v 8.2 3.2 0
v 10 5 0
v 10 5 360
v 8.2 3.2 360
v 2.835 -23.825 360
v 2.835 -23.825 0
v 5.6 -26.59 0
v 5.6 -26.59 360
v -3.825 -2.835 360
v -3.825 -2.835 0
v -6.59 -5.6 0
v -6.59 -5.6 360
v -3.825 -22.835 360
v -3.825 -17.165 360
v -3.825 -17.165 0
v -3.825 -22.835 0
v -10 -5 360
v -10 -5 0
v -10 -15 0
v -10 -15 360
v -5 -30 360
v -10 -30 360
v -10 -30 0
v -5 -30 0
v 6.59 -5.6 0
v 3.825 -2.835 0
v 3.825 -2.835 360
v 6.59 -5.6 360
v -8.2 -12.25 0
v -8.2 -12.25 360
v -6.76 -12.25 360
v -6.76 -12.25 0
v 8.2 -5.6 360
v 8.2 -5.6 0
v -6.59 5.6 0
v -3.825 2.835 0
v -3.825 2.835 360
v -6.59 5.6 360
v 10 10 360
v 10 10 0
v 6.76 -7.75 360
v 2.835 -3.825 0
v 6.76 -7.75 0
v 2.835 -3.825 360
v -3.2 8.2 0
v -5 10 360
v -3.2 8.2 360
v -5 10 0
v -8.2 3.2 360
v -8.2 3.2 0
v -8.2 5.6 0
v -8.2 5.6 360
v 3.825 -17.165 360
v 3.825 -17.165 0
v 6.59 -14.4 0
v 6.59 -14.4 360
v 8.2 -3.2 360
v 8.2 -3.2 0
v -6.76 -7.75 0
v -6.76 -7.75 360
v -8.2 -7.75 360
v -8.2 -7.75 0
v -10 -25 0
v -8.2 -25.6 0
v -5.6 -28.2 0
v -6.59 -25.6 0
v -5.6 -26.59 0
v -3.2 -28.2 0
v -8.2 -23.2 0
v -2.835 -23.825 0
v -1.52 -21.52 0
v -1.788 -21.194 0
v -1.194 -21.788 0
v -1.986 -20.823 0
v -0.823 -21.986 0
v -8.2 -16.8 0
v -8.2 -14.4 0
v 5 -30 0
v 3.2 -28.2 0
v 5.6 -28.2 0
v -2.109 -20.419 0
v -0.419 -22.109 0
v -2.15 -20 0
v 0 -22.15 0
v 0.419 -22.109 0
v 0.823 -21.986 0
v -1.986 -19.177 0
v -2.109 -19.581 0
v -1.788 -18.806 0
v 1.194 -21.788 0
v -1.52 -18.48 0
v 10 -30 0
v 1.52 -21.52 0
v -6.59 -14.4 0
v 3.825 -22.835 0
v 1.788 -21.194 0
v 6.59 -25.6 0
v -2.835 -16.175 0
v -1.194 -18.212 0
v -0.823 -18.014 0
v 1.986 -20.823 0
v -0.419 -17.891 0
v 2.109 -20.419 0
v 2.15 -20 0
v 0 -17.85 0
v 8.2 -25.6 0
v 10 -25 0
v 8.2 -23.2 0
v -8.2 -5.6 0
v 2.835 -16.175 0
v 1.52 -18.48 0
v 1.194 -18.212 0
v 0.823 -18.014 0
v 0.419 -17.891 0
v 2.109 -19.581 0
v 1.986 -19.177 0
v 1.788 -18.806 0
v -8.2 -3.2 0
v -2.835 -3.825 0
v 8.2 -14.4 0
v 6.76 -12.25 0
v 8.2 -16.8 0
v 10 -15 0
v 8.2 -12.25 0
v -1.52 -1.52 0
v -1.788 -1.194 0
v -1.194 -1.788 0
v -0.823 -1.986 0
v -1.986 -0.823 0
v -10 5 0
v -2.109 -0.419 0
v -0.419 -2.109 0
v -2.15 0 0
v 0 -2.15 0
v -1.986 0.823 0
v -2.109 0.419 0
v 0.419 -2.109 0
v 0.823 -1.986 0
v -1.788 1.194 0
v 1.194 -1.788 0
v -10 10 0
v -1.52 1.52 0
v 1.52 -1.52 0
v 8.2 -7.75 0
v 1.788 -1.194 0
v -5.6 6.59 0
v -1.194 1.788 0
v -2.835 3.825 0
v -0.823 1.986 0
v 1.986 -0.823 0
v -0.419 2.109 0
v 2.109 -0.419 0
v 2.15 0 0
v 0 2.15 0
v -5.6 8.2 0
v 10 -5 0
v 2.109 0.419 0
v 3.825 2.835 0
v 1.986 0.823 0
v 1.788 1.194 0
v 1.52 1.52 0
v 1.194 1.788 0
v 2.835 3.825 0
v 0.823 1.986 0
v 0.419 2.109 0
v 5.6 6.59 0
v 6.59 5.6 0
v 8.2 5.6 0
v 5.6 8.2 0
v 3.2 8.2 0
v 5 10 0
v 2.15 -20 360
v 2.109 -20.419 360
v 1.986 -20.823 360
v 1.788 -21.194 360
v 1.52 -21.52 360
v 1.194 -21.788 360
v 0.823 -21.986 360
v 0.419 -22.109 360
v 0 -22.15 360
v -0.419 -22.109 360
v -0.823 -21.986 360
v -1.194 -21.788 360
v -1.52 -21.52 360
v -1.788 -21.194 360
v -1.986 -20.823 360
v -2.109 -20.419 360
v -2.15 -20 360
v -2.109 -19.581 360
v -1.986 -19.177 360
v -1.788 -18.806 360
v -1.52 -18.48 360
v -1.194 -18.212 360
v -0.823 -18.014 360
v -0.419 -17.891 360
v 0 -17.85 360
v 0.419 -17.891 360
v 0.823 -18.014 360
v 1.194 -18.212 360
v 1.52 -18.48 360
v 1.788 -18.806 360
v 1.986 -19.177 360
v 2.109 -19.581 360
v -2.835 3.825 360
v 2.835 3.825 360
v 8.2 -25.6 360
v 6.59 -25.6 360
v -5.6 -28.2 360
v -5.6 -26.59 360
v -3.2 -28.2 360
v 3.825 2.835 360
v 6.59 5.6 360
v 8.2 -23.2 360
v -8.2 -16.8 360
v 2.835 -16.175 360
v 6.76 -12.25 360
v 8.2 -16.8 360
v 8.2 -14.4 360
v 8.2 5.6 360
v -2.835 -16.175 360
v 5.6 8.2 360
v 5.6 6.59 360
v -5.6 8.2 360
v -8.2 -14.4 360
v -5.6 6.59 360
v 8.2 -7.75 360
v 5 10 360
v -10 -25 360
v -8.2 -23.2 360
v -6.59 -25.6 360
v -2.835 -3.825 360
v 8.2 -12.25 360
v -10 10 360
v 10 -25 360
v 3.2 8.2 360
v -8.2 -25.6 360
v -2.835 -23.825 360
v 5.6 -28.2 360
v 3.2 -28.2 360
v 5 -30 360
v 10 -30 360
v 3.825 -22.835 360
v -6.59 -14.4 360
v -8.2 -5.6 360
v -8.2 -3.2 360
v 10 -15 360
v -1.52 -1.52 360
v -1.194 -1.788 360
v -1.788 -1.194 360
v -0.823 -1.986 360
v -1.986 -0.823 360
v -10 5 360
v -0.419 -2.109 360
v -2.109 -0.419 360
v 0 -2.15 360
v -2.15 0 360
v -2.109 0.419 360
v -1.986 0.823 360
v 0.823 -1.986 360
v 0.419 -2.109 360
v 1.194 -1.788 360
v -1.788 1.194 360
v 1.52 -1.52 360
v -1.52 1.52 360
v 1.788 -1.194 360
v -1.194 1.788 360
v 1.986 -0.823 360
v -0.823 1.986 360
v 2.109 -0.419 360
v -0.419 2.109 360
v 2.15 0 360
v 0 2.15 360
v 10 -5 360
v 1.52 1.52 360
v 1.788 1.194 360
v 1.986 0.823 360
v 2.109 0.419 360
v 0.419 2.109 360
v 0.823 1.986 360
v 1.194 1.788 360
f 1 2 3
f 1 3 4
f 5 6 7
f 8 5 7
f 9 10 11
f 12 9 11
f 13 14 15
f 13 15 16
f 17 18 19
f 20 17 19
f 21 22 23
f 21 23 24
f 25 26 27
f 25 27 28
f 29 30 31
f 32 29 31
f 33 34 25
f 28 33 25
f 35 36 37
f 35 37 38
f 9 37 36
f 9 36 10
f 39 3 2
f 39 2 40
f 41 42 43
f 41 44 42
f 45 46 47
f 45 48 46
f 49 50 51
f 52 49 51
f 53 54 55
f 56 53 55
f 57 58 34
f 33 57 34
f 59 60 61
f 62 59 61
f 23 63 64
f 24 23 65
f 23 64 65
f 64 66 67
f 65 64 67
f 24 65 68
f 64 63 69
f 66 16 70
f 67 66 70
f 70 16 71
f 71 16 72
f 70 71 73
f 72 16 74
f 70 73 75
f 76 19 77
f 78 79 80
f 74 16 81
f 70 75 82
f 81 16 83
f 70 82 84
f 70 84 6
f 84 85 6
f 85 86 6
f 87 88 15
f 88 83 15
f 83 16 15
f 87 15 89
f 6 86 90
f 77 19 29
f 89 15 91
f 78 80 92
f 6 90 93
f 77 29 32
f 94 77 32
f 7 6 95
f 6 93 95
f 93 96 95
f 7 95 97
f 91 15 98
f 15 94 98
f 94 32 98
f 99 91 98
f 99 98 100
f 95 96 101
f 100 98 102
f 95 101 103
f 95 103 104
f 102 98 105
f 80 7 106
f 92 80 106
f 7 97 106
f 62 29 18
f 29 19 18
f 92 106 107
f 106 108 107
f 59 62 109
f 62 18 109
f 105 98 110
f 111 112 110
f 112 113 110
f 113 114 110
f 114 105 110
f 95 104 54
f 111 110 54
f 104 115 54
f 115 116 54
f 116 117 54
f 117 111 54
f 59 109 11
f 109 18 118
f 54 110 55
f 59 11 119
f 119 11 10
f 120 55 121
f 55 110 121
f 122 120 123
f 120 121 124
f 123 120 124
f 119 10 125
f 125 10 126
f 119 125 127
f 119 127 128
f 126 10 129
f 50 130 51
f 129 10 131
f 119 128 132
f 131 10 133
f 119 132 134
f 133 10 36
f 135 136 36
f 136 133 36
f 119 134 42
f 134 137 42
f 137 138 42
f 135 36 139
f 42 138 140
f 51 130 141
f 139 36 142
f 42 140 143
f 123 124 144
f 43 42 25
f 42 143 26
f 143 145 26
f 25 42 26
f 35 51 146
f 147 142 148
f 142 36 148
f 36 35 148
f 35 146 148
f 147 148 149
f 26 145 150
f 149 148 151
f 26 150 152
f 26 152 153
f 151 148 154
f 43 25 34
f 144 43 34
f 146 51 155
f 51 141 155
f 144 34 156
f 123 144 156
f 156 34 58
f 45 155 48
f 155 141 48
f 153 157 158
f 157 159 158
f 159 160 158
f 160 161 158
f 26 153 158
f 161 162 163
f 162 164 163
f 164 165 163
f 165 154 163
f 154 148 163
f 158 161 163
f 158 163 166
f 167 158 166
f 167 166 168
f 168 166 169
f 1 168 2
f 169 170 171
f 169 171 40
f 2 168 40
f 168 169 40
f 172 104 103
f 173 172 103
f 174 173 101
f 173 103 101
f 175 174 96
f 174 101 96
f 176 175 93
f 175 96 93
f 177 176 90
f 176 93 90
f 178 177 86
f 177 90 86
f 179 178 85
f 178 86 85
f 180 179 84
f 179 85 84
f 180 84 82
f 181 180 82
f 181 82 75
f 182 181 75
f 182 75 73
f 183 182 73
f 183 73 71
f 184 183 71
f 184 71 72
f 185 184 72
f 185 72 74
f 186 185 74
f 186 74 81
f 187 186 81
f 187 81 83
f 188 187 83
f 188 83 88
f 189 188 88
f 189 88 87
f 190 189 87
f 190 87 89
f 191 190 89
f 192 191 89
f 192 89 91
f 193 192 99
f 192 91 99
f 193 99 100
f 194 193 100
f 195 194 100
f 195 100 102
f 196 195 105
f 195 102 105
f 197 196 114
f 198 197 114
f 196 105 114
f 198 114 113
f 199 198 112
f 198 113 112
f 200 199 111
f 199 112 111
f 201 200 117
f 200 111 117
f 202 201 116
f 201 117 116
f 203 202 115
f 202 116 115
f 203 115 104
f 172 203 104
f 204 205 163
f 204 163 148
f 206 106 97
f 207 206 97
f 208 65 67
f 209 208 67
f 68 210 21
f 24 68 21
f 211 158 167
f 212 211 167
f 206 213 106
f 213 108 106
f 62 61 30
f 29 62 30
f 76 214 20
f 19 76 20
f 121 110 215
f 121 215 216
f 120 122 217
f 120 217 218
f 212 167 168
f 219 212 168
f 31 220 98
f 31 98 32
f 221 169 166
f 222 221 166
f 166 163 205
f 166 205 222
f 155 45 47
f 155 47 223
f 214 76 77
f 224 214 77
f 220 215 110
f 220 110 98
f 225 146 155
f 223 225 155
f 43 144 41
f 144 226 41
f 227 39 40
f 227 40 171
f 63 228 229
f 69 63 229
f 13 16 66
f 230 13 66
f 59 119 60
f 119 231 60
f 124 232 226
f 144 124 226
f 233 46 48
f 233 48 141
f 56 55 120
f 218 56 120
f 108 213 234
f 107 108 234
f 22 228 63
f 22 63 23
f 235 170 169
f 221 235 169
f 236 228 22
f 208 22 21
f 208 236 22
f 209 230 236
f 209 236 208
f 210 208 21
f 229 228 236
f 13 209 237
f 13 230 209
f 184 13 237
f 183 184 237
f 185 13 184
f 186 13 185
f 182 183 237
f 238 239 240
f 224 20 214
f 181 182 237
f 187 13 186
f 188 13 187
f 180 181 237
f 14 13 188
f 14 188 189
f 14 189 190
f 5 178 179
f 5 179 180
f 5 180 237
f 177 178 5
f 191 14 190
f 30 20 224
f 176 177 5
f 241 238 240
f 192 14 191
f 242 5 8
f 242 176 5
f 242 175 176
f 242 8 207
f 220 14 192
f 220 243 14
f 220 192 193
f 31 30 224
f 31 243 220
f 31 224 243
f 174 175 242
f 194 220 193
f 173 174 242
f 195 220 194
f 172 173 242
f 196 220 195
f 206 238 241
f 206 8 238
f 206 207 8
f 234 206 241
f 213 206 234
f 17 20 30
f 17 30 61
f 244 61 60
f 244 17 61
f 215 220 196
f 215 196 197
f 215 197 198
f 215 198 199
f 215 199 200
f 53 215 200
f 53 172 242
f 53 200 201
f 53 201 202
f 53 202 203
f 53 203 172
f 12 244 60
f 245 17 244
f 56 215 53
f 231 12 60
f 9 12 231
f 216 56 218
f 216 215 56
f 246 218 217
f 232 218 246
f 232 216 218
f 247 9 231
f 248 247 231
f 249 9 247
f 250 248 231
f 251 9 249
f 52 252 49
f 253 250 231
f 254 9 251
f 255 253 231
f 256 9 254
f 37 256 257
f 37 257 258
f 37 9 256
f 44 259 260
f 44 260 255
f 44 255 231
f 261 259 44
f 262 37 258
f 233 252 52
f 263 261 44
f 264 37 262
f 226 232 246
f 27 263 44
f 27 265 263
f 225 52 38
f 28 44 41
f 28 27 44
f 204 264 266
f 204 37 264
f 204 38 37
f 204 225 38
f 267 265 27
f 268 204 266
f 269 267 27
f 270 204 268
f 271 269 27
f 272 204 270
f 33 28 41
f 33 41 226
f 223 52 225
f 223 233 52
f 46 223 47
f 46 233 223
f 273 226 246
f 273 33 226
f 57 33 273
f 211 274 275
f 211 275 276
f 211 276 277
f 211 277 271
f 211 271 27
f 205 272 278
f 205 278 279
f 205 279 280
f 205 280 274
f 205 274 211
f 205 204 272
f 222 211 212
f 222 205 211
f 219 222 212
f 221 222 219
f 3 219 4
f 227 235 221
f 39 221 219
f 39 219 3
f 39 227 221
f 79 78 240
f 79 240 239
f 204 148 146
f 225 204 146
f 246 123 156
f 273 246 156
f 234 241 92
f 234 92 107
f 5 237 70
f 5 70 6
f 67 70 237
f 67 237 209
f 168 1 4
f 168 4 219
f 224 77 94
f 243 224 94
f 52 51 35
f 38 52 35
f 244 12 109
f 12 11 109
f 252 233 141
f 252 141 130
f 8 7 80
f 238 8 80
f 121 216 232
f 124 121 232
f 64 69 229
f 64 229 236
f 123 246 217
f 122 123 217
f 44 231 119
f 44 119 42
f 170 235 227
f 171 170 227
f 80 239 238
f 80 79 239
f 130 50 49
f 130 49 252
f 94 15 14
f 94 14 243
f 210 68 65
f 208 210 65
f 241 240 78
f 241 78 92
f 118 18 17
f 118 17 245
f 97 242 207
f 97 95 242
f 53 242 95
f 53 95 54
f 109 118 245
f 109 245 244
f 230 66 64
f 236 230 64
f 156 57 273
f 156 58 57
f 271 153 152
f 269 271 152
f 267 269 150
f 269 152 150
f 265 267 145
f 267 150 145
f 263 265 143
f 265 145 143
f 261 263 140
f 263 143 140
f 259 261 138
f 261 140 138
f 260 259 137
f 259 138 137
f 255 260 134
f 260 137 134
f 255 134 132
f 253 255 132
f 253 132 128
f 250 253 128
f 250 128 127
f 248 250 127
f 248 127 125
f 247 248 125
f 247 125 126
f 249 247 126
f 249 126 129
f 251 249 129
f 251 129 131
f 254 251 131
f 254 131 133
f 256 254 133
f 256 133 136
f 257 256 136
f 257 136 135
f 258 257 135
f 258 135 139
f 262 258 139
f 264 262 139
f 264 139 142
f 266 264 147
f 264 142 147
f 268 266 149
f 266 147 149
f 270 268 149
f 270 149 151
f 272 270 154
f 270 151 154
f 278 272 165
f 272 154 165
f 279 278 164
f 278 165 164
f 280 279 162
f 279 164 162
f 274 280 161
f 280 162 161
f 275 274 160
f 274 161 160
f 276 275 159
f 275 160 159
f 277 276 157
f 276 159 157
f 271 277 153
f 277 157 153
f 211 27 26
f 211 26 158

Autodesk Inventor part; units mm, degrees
ref_plane "YZ Plane" through (0, 0, 0) normal (1, 0, 0) x (0, 1, 0)
ref_plane "XZ Plane" through (0, 0, 0) normal (0, 1, 0) x (-1, 0, 0)
ref_plane "XY Plane" through (0, 0, 0) normal (0, 0, 1) x (1, 0, 0)
sketch "Sketch1" plane through (0, 0, 0) normal (0, 0, 1) x (1, 0, 0)
  line L0 (-10, -10) -> (-5.6, -10)
  line L1 (-10, -5.6) -> (-10, -10)
  line L2 (-5.6, -10) -> (-5, -10)
  line L3 (-3.2, -8.2) -> (-5.6, -8.2)
  line L4 (-2.8351, -3.825) -> (-5.6, -6.5899)
  line L5 (-3.825, -2.8351) -> (-6.5899, -5.6)
  line L6 (0, 0) -> (0, -11) construction
  line L7 (0, 0) -> (-12, 0) construction
  line L8 (-3.2, -8.2) -> (-5, -10)
  line L9 (-6.5899, -5.6) -> (-8.2, -5.6)
  line L10 (-10, -5.6) -> (-10, -5)
  line L11 (-10, -5) -> (-8.2, -3.2)
  line L12 (-8.2, -3.2) -> (-8.2, -5.6)
  line L13 (-5.6, -8.2) -> (-5.6, -6.5899)
  arc A0 (-2.15, 0) -> (0, -2.15) centre (0, 0) ccw
  line L14 (0, 0) -> (-3.825, 0)
  line L15 (-3.825, 0) -> (-3.825, -2.8351)
  line L16 (-2.8351, -3.825) -> (0, -3.825)
  line L17 (0, -3.825) -> (0, 0)
  line L18 (-2.8351, -3.825) -> (-3.825, -3.825) construction
  line L19 (-3.825, -3.825) -> (-3.825, -2.8351) construction
  line L20 (3.825, -2.8351) -> (3.825, -3.825) construction
  line L21 (3.825, -2.8351) -> (3.825, 0)
  line L22 (3.825, -3.825) -> (2.8351, -3.825) construction
  line L23 (3.825, 0) -> (0, 0)
  line L24 (0, -3.825) -> (2.8351, -3.825)
  arc A1 (0, -2.15) -> (2.15, 0) centre (0, 0) ccw
  line L25 (0, 0) -> (0, -3.825)
  line L26 (2.8351, -3.825) -> (5.6, -6.5899)
  line L27 (0, 0) -> (0, -12) construction
  line L28 (0, 0) -> (11, 0) construction
  line L29 (3.825, -2.8351) -> (6.5899, -5.6)
  line L30 (8.2, -3.2) -> (8.2, -5.6)
  line L31 (10, -5.6) -> (10, -5)
  line L32 (8.2, -3.2) -> (10, -5)
  line L33 (8.2, -5.6) -> (6.5899, -5.6)
  line L34 (5.6, -6.5899) -> (5.6, -8.2)
  line L35 (10, -10) -> (10, -5.6)
  line L36 (5.6, -10) -> (10, -10)
  line L37 (3.2, -8.2) -> (5.6, -8.2)
  line L38 (5, -10) -> (3.2, -8.2)
  line L39 (5.6, -10) -> (5, -10)
  line L40 (2.8351, 3.825) -> (3.825, 3.825) construction
  line L41 (2.8351, 3.825) -> (0, 3.825)
  line L42 (3.825, 3.825) -> (3.825, 2.8351) construction
  line L43 (0, 3.825) -> (0, 0)
  line L44 (3.825, 0) -> (3.825, 2.8351)
  arc A2 (2.15, 0) -> (0, 2.15) centre (0, 0) ccw
  line L45 (0, 0) -> (3.825, 0)
  line L46 (3.825, 2.8351) -> (6.5899, 5.6)
  line L47 (0, 0) -> (12, 0) construction
  line L48 (0, 0) -> (0, 11) construction
  line L49 (2.8351, 3.825) -> (5.6, 6.5899)
  line L50 (3.2, 8.2) -> (5.6, 8.2)
  line L51 (5.6, 10) -> (5, 10)
  line L52 (3.2, 8.2) -> (5, 10)
  line L53 (5.6, 8.2) -> (5.6, 6.5899)
  line L54 (6.5899, 5.6) -> (8.2, 5.6)
  line L55 (10, 10) -> (5.6, 10)
  line L56 (10, 5.6) -> (10, 10)
  line L57 (8.2, 3.2) -> (8.2, 5.6)
  line L58 (10, 5) -> (8.2, 3.2)
  line L59 (10, 5.6) -> (10, 5)
  line L60 (-3.825, 2.8351) -> (-3.825, 3.825) construction
  line L61 (-3.825, 2.8351) -> (-3.825, 0)
  line L62 (-3.825, 3.825) -> (-2.8351, 3.825) construction
  line L63 (-3.825, 0) -> (0, 0)
  line L64 (0, 3.825) -> (-2.8351, 3.825)
  arc A3 (0, 2.15) -> (-2.15, 0) centre (0, 0) ccw
  line L65 (0, 0) -> (0, 3.825)
  line L66 (-2.8351, 3.825) -> (-5.6, 6.5899)
  line L67 (0, 0) -> (0, 12) construction
  line L68 (0, 0) -> (-11, 0) construction
  line L69 (-3.825, 2.8351) -> (-6.5899, 5.6)
  line L70 (-8.2, 3.2) -> (-8.2, 5.6)
  line L71 (-10, 5.6) -> (-10, 5)
  line L72 (-8.2, 3.2) -> (-10, 5)
  line L73 (-8.2, 5.6) -> (-6.5899, 5.6)
  line L74 (-5.6, 6.5899) -> (-5.6, 8.2)
  line L75 (-10, 10) -> (-10, 5.6)
  line L76 (-5.6, 10) -> (-10, 10)
  line L77 (-3.2, 8.2) -> (-5.6, 8.2)
  line L78 (-5, 10) -> (-3.2, 8.2)
  line L79 (-5.6, 10) -> (-5, 10)
  point P0 (0, 2.15)
  point P1 (2.15, 0)
  point P2 (0, -2.15)
  dimension "d16" = 10
  dimension "d19" = 3.2
  dimension "d21" = 4.4
  dimension "d22" = 4.4
  dimension "d24" = 45
  dimension "d25" = 1.8
  dimension "d27" = 1.8
  dimension "d28" = 45
  dimension "d29" = 3.2
  dimension "d31" = 1.4
  dimension "d33" = 2.15
  dimension "d34" = 3.825
  dimension "d35" = 3.825
  dimension "d36" = 135
  dimension "d39" = 360
extrude "Extrusion1" add sketch "Sketch1" along normal blind 360 contours L1 L10 L11 L12 L9 L5 L15 L14 A0 L17 L16 L4 L13 L3 L8 L2 L0 | L17 A1 L23 L21 L29 L33 L30 L32 L31 L35 L36 L39 L38 L37 L34 L26 L24 | L61 L69 L73 L70 L72 L71 L75 L76 L79 L78 L77 L74 L66 L64 L43 A3 L14 | A2 L43 L41 L49 L53 L50 L52 L51 L55 L56 L59 L58 L57 L54 L46 L44 L23
pattern_linear "Rectangular Pattern1" count 2 spacing 20 along (0, -1, 0) of "Extrusion1"
sketch "Sketch2" plane through (0, 0, 360) normal (0, 0, 1) x (1, 0, 0)
  line L0 (3.2, -8.2) -> (5, -10) projected
  line L1 (-3.2, -11.8) -> (-5, -10) projected
  line L2 (5, -10) -> (-5, -10) construction
  line L3 (-8.2, -12.25) -> (8.2, -12.25)
  line L4 (8.2, -12.25) -> (8.2, -7.75)
  line L5 (8.2, -7.75) -> (-8.2, -7.75)
  line L6 (-8.2, -7.75) -> (-8.2, -12.25)
  line L7 (-8.2, -12.25) -> (8.2, -7.75) construction
  line L8 (8.2, -12.25) -> (-8.2, -7.75) construction
  line L9 (10, -15) -> (10, -5) projected
  line L10 (5.6, -6.5899) -> (5.6, -8.2) projected
  line L11 (5.6, -6.5899) -> (6.7601, -7.75)
  line L12 (-5.6, -6.5899) -> (-2.8351, -3.825) projected
  line L13 (-5.6, -6.5899) -> (-6.7601, -7.75)
  line L14 (5.6, -13.4101) -> (6.7601, -12.25)
  line L15 (-5.6, -13.4101) -> (-6.7601, -12.25)
  line L16 (-5.6, -6.5899) -> (-5.6, -7.75)
  line L17 (-5.6, -8.2) -> (-5.6, -6.5899) projected
  line L18 (5.6, -6.5899) -> (5.6, -7.75)
  line L19 (-5.6, -11.8) -> (-5.6, -13.4101)
  line L20 (5.6, -13.4101) -> (5.6, -12.25)
  point P0 (0, 0)
  point P1 (0, -10)
  point P2 (-5.6, -12.25)
  dimension "d46" = 4.5
  dimension "d50" = 1.8
extrude "Extrusion2" cut sketch "Sketch2" against normal blind 400
properties part number "AP20x20"
